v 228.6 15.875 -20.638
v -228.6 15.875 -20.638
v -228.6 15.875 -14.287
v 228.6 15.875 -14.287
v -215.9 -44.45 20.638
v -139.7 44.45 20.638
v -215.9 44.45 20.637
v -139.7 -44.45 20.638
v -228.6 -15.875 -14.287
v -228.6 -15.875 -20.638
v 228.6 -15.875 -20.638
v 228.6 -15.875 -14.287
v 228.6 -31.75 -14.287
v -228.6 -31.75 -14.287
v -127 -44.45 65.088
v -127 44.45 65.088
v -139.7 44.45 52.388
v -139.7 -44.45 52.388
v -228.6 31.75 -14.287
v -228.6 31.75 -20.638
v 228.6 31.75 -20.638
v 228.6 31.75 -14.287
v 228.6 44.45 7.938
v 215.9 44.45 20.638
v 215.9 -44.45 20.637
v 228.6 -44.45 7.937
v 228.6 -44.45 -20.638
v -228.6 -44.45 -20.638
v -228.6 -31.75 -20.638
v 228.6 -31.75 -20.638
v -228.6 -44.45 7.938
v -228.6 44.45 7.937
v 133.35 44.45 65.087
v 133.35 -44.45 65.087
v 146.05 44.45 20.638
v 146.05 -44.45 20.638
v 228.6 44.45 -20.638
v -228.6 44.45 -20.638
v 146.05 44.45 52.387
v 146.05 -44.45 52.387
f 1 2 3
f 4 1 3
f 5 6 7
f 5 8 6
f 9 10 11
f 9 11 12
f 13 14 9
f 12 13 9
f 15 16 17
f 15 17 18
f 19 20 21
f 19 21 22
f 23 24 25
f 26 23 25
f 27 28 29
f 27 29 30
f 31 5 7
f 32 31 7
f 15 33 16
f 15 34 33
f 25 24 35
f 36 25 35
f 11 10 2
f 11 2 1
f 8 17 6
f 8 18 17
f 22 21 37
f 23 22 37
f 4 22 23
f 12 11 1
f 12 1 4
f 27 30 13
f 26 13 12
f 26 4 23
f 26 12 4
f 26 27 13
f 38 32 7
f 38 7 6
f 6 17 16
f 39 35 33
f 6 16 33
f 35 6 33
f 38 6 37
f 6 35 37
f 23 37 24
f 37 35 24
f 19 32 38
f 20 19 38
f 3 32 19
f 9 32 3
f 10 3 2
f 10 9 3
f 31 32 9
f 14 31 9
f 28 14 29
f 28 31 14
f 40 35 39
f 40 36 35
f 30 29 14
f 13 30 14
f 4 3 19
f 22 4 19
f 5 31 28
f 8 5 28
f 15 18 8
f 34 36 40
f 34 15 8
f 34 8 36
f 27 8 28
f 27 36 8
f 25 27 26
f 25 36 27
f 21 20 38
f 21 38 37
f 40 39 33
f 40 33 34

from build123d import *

# Parameters (mm, degrees)
F1_DEPTH = 44.45
F2_SIZE  = 12.7
F3_W     = 15.875
F3_H     = 6.35
F4_DEPTH = 241.3


with BuildPart() as f1:
    # F0 (on Front) → F1 (new body, symmetric)
    with BuildSketch(Plane.XZ):
        Polygon((228.6, -20.6375), (228.6, 20.6375), (146.05, 20.6375), (146.05, 65.0875), (-139.7, 65.0875), (-139.7, 20.6375), (-228.6, 20.6375), (-228.6, -20.6375), align=None)
    extrude(amount=F1_DEPTH, both=True)

    # F2
    f2_edges = [f1.edges().sort_by_distance(p)[0] for p in [
        (146.05, 0, 65.0875),
        (-139.7, 0, 65.0875),
        (-228.6, 0, 20.6375),
        (228.6, 0, 20.6375),
    ]]
    chamfer(f2_edges, length=F2_SIZE)

    # F3 (on Right) → F4 (cut, symmetric)
    with BuildSketch(Plane.YZ):
        with Locations((-23.8125, -17.4625)):
            Rectangle(F3_W, F3_H)
        with Locations((23.8125, -17.4625)):
            Rectangle(F3_W, F3_H)
    extrude(amount=F4_DEPTH, both=True, mode=Mode.SUBTRACT)


solid = f1.part
